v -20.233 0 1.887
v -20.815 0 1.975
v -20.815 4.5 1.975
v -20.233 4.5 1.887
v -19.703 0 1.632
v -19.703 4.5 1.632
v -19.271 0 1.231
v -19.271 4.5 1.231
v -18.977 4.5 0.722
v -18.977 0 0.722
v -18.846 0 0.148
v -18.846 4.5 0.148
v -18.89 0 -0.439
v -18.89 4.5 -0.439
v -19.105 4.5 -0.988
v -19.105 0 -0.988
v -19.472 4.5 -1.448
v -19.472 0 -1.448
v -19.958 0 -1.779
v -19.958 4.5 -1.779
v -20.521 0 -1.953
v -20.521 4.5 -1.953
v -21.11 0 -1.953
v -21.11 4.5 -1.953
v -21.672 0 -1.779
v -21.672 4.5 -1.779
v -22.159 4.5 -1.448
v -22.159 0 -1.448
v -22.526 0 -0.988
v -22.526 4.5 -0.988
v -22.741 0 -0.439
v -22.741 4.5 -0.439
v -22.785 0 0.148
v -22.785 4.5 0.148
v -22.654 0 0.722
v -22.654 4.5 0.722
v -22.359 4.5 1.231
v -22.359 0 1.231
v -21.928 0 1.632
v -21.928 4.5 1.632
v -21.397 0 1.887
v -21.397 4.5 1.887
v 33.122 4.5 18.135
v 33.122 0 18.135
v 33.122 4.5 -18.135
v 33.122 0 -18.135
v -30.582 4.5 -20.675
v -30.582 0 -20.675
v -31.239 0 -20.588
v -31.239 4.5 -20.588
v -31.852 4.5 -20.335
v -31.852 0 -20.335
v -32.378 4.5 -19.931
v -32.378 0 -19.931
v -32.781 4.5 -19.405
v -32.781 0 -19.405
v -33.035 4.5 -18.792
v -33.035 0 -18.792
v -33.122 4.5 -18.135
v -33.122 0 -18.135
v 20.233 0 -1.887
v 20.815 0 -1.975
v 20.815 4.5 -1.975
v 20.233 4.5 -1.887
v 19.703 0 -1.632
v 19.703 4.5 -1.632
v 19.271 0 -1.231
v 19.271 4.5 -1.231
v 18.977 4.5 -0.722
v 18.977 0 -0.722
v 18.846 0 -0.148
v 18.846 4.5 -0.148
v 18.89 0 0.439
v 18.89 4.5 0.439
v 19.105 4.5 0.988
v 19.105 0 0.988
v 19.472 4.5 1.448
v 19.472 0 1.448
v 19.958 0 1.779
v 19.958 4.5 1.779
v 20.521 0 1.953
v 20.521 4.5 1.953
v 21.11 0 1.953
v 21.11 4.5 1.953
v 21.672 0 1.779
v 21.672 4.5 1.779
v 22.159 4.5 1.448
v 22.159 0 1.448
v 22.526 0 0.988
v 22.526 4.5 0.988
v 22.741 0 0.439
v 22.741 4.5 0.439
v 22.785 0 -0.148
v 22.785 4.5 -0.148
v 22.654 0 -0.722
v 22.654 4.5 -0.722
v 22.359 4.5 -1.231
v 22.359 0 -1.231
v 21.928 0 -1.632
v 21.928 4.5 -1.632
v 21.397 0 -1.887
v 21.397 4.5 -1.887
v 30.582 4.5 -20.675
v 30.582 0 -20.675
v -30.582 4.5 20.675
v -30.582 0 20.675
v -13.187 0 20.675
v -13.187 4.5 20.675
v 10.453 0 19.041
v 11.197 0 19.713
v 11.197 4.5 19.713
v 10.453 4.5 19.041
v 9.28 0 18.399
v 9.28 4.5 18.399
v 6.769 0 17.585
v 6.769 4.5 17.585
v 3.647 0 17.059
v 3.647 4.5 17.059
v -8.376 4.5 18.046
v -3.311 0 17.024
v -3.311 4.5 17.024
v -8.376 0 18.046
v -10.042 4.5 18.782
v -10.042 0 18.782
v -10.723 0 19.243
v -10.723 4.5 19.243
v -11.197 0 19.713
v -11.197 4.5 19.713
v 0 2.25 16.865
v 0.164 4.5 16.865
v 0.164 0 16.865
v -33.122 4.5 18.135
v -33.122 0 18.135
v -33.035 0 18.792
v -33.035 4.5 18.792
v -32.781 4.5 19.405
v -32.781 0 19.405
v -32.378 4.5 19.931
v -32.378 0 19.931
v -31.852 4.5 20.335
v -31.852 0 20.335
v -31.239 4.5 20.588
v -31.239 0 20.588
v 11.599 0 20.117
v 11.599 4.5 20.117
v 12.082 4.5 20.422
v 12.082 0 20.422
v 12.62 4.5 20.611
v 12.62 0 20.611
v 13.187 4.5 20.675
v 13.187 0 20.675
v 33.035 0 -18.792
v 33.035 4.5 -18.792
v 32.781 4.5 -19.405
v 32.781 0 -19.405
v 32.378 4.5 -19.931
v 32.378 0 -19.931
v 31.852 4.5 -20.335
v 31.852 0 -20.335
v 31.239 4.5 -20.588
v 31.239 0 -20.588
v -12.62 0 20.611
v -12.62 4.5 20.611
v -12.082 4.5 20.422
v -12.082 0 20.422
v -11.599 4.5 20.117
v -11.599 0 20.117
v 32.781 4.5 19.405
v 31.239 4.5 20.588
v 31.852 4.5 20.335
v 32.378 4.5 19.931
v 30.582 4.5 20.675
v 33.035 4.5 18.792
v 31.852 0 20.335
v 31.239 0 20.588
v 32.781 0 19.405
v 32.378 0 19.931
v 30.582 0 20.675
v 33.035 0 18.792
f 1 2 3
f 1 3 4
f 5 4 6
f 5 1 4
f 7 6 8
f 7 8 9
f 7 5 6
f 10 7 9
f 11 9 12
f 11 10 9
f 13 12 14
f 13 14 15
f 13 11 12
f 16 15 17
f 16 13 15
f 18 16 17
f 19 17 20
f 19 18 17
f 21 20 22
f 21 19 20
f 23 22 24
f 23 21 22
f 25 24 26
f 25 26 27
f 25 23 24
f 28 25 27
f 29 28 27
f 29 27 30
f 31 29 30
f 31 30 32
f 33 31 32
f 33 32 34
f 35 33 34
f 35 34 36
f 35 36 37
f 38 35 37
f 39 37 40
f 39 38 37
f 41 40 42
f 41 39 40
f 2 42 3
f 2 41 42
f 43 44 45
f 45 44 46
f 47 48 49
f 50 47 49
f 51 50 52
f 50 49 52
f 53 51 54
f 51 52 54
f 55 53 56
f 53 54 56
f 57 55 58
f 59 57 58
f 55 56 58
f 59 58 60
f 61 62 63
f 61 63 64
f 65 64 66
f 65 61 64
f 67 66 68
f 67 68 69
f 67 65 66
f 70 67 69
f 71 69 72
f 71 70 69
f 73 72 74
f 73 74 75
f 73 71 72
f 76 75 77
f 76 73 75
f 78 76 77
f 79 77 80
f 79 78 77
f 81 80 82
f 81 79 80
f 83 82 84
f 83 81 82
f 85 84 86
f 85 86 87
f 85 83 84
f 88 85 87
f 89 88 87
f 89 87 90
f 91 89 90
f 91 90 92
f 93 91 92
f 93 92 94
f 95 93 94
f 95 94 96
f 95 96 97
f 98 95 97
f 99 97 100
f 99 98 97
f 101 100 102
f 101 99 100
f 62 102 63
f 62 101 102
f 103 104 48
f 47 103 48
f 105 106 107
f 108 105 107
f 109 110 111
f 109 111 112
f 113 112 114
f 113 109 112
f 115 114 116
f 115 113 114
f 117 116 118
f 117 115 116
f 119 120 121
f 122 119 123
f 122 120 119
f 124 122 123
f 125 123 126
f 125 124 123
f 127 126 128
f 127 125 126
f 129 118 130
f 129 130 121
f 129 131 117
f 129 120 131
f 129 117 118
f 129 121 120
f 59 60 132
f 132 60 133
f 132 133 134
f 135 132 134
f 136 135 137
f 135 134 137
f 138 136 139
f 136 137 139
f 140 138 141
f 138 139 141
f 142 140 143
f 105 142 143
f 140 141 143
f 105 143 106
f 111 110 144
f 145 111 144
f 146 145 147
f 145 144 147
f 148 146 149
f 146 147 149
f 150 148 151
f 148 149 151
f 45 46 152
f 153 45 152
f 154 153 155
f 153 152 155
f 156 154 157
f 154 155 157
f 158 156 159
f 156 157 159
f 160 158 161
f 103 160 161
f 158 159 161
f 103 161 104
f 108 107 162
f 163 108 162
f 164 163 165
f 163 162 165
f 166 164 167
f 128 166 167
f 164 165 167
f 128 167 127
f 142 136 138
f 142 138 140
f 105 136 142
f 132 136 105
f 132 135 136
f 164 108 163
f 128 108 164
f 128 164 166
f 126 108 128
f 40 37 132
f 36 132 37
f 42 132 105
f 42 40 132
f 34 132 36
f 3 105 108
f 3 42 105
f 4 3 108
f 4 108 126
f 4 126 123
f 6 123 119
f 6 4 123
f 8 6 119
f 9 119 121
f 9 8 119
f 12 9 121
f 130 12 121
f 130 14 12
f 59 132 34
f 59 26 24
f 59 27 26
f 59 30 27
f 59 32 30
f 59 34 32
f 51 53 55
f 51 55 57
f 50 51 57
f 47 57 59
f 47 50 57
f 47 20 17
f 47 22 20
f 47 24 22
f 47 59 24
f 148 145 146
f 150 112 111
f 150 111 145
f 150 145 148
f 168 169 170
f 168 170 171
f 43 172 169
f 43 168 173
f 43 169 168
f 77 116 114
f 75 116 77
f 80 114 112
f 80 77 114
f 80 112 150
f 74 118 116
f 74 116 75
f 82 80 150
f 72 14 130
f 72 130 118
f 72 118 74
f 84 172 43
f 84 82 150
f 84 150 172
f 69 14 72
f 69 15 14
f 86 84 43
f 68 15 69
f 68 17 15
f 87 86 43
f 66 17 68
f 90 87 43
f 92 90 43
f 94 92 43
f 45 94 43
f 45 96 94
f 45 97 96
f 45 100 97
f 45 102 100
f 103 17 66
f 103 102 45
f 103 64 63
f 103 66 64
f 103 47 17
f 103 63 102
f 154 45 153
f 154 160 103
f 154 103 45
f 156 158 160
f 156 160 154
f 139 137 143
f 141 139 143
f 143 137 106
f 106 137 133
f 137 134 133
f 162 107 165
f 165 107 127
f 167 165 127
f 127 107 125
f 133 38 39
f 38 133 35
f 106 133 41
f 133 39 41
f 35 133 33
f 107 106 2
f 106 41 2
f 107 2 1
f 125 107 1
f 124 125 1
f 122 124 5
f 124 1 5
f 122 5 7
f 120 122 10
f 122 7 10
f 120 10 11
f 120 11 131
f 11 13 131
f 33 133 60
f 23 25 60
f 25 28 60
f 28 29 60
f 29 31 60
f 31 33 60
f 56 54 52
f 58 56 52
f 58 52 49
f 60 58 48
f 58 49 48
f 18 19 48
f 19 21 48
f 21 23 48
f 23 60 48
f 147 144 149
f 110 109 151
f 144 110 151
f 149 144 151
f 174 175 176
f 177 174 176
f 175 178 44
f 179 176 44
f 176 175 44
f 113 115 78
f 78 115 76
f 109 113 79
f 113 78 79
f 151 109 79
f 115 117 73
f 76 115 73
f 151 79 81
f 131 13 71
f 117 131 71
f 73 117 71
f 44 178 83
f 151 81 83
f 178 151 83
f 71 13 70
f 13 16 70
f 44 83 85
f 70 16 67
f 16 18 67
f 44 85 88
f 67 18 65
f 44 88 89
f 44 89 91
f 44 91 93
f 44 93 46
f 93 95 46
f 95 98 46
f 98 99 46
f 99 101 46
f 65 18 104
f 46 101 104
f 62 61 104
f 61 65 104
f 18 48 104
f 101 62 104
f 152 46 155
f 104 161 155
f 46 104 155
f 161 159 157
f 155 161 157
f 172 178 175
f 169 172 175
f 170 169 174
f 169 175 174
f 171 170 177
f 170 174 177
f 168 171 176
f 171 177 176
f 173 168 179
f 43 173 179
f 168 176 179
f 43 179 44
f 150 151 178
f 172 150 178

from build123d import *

# Parameters (mm, degrees)
SKETCH1_R           = 1.975
BOSS_EXTRUDE1_DEPTH = 4.5


with BuildPart() as part:
    # Sketch1 → Boss-Extrude1 (new body)
    with BuildSketch(Plane(origin=(0, 0, 0), x_dir=(1, 0, 0), z_dir=(0, 1, 0))):
        with BuildLine():
            Line((30.5816, 20.675), (-30.5816, 20.675))
            ThreePointArc((-30.5816, 20.675), (-32.377651224, 19.931051224), (-33.1216, 18.135))
            Line((-33.1216, 18.135), (-33.1216, -18.135))
            ThreePointArc((-33.1216, -18.135), (-32.377651224, -19.931051224), (-30.5816, -20.675))
            Line((-30.5816, -20.675), (-13.187240763, -20.675))
            ThreePointArc((-13.187240763, -20.675), (-12.081828105, -20.421845613), (-11.196761955, -19.712844768))
            add(Edge.make_bspline(
                [(11.196761955, -19.712844768), (8.939286543, -16.865), (0, -16.865), (-8.939286543, -16.865), (-11.196761955, -19.712844768)],
                knots=[3.396891088, 3.396891088, 3.396891088, 4.71238898, 4.71238898, 6.027886873, 6.027886873, 6.027886873], degree=2, weights=[1, 0.791370388, 1, 0.791370388, 1]))
            ThreePointArc((11.196761955, -19.712844768), (12.081828105, -20.421845613), (13.187240763, -20.675))
            Line((13.187240763, -20.675), (30.5816, -20.675))
            ThreePointArc((30.5816, -20.675), (32.377651224, -19.931051224), (33.1216, -18.135))
            Line((33.1216, -18.135), (33.1216, 18.135))
            ThreePointArc((33.1216, 18.135), (32.377651224, 19.931051224), (30.5816, 20.675))
        make_face()
        with Locations(Location((-20.8153, 0, 0), (0, 0, 270))):
            Circle(SKETCH1_R, mode=Mode.SUBTRACT)
        with Locations(Location((20.8153, 0, 0), (0, 0, 90))):
            Circle(SKETCH1_R, mode=Mode.SUBTRACT)
    extrude(amount=BOSS_EXTRUDE1_DEPTH)


solid = part.part
